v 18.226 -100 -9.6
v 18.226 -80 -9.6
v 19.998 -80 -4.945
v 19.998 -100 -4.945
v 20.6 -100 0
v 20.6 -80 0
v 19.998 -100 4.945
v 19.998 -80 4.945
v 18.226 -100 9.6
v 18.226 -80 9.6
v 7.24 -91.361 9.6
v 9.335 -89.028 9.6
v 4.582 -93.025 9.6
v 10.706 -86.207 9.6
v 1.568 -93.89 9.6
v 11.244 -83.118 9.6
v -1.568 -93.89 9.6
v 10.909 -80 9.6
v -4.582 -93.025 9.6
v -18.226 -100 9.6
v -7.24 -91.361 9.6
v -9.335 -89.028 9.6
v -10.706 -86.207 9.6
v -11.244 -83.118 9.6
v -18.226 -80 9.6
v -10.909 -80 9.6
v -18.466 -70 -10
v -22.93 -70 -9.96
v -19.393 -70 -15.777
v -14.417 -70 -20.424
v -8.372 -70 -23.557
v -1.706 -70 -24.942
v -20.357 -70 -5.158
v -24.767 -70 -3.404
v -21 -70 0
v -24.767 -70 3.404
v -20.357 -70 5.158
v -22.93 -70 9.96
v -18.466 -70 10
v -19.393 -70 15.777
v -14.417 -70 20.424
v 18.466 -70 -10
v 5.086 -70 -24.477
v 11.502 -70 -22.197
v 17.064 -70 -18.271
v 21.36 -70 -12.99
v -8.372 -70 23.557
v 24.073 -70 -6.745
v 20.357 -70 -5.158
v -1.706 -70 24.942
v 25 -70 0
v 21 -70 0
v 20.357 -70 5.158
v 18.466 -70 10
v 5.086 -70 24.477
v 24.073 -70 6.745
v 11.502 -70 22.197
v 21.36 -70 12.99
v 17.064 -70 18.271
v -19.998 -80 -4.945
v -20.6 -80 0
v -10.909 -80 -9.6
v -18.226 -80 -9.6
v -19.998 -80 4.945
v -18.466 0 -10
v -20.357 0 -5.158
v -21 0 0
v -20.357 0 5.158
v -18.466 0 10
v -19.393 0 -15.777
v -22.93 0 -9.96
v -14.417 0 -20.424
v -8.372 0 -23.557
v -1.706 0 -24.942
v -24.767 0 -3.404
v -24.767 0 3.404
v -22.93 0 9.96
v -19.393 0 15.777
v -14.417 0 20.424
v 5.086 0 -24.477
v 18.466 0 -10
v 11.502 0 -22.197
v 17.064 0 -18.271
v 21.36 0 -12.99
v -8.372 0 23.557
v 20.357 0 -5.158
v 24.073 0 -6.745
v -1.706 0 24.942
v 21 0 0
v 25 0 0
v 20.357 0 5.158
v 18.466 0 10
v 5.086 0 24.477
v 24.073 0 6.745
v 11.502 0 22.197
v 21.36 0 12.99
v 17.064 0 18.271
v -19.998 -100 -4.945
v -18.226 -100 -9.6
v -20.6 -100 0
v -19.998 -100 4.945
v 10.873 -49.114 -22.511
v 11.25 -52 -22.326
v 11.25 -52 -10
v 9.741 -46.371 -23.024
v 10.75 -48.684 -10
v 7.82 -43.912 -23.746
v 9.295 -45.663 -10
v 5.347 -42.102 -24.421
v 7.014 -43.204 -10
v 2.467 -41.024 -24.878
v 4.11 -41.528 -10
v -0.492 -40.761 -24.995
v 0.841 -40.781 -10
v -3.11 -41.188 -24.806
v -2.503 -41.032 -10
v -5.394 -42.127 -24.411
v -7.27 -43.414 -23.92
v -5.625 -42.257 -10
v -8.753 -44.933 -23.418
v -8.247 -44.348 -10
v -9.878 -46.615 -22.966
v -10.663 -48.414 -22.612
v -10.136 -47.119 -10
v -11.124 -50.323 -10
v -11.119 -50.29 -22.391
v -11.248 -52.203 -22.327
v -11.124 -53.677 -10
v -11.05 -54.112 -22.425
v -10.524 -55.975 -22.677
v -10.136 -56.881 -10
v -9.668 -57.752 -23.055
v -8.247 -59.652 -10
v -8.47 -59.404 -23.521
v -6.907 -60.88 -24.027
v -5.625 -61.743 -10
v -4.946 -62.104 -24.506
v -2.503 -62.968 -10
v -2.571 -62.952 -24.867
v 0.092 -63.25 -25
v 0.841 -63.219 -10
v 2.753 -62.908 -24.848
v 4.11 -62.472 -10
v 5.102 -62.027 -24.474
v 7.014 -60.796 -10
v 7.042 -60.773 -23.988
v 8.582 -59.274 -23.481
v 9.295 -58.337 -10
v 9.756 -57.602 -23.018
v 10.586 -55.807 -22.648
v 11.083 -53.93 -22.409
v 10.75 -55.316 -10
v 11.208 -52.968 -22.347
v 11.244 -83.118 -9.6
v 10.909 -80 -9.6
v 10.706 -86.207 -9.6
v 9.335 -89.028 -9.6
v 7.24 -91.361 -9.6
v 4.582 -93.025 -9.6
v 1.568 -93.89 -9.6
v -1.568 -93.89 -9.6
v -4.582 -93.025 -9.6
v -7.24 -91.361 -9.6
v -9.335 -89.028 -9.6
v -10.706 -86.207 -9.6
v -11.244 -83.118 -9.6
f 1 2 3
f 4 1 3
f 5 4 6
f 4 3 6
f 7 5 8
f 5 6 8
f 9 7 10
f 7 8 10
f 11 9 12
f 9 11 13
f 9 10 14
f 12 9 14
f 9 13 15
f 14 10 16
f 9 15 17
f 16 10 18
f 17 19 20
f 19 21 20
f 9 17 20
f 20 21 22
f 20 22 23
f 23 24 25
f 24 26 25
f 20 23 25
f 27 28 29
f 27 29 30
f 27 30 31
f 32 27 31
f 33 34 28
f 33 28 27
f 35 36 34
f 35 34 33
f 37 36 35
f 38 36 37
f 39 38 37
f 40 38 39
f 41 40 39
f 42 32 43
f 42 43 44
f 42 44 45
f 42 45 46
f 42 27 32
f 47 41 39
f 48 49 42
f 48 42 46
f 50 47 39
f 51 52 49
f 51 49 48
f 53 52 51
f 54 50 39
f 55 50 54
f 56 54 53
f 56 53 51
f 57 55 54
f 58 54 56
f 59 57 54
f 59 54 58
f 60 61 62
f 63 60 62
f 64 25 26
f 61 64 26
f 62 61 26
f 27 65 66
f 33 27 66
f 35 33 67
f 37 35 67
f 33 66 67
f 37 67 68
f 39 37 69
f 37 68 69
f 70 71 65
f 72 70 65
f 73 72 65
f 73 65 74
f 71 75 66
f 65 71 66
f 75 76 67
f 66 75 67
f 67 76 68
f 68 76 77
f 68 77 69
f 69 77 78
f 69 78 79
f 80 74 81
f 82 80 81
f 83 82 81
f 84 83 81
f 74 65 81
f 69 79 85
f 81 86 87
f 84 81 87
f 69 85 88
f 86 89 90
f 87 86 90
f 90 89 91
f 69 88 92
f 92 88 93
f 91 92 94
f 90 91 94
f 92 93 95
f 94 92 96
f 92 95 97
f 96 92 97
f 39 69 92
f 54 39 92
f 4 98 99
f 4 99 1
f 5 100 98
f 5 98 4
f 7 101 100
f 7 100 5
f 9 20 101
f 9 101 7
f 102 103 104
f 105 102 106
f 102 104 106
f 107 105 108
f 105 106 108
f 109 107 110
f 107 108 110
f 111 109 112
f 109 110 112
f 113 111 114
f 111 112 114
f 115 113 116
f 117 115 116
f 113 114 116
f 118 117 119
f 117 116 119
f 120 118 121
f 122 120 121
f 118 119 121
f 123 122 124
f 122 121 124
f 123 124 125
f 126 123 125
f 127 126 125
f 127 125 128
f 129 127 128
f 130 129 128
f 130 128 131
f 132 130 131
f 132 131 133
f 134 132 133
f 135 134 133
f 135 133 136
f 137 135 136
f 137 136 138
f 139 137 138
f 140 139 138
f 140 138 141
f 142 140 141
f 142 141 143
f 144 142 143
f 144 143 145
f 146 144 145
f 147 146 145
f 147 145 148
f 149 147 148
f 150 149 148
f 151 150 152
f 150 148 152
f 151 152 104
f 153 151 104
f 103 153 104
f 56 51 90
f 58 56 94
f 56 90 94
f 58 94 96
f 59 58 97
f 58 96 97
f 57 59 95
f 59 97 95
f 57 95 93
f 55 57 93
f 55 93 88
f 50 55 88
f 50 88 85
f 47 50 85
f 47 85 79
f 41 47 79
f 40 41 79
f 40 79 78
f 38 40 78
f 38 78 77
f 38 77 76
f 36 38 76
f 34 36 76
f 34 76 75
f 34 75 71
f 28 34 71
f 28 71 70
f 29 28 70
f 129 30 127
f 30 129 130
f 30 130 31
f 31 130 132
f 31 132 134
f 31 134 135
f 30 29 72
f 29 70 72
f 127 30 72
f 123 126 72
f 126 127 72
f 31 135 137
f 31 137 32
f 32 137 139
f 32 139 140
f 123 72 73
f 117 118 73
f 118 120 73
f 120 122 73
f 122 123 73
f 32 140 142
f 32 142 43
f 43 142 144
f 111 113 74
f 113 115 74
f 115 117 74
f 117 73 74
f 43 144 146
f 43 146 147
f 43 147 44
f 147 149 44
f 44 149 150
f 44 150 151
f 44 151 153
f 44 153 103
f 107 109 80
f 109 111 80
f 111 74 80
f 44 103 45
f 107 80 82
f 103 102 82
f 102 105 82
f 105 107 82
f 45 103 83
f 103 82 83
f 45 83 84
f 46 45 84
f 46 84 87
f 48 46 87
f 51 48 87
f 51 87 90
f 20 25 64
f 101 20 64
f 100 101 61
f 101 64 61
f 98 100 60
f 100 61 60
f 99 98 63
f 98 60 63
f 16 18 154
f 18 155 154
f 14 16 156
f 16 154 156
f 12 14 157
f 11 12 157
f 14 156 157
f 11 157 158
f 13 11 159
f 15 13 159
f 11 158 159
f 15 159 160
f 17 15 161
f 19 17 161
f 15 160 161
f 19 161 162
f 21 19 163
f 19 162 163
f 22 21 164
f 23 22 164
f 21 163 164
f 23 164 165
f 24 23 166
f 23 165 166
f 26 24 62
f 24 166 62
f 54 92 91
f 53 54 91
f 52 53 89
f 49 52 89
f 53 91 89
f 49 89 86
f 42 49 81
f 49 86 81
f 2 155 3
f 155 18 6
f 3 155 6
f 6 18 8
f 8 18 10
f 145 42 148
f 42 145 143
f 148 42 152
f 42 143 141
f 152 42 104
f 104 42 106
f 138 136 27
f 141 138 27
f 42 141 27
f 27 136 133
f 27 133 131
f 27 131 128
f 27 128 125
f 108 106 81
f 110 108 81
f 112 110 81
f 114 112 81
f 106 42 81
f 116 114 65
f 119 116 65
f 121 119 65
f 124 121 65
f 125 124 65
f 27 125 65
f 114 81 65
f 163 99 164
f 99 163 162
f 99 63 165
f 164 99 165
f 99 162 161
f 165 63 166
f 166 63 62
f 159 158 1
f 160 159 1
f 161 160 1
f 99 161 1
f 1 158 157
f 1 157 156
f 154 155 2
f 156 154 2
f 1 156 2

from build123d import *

# Parameters (mm, degrees)
F0_R     = 25
F1_DEPTH = 70
F2_R     = 11.25
F3_DEPTH = 25
F6_DEPTH = 20
F7_R     = 11.25
F8_DEPTH = 19.2


with BuildPart() as f1:
    # F0 (on Front) → F1 (new body)
    with BuildSketch(Plane.XZ):
        Circle(F0_R)
        with BuildLine():
            ThreePointArc((-18.466185, -10), (-21, 0), (-18.466185, 10))
            Line((-18.466185, 10), (18.466185, 10))
            ThreePointArc((18.466185, 10), (21, 0), (18.466185, -10))
            Line((18.466185, -10), (-18.466185, -10))
        make_face(mode=Mode.SUBTRACT)
    extrude(amount=F1_DEPTH)

    # F2 (on Top) → F3 (cut)
    with BuildSketch(Plane.XY):
        with Locations((0, -52)):
            Circle(F2_R)
    extrude(amount=-F3_DEPTH, mode=Mode.SUBTRACT)


with BuildPart() as f6:
    # F5 (on offset) → F6 (new body)
    with BuildSketch(Plane.XZ.offset(80)):
        with BuildLine():
            Line((18.226355, 9.6), (-18.226355, 9.6))
            ThreePointArc((-18.226355, 9.6), (-20.6, 0), (-18.226355, -9.6))
            Line((-18.226355, -9.6), (18.226355, -9.6))
            ThreePointArc((18.226355, -9.6), (20.6, 0), (18.226355, 9.6))
        make_face()
    extrude(amount=F6_DEPTH)

    # F7 (on face) → F8 (cut, through all)
    with BuildSketch(Plane(origin=(0, 0, -9.6), x_dir=(1, 0, 0), z_dir=(0, 0, -1))):
        with Locations((0, 82.75)):
            Circle(F7_R)
    extrude(amount=-F8_DEPTH, mode=Mode.SUBTRACT)


solid = Compound([f1.part, f6.part])
